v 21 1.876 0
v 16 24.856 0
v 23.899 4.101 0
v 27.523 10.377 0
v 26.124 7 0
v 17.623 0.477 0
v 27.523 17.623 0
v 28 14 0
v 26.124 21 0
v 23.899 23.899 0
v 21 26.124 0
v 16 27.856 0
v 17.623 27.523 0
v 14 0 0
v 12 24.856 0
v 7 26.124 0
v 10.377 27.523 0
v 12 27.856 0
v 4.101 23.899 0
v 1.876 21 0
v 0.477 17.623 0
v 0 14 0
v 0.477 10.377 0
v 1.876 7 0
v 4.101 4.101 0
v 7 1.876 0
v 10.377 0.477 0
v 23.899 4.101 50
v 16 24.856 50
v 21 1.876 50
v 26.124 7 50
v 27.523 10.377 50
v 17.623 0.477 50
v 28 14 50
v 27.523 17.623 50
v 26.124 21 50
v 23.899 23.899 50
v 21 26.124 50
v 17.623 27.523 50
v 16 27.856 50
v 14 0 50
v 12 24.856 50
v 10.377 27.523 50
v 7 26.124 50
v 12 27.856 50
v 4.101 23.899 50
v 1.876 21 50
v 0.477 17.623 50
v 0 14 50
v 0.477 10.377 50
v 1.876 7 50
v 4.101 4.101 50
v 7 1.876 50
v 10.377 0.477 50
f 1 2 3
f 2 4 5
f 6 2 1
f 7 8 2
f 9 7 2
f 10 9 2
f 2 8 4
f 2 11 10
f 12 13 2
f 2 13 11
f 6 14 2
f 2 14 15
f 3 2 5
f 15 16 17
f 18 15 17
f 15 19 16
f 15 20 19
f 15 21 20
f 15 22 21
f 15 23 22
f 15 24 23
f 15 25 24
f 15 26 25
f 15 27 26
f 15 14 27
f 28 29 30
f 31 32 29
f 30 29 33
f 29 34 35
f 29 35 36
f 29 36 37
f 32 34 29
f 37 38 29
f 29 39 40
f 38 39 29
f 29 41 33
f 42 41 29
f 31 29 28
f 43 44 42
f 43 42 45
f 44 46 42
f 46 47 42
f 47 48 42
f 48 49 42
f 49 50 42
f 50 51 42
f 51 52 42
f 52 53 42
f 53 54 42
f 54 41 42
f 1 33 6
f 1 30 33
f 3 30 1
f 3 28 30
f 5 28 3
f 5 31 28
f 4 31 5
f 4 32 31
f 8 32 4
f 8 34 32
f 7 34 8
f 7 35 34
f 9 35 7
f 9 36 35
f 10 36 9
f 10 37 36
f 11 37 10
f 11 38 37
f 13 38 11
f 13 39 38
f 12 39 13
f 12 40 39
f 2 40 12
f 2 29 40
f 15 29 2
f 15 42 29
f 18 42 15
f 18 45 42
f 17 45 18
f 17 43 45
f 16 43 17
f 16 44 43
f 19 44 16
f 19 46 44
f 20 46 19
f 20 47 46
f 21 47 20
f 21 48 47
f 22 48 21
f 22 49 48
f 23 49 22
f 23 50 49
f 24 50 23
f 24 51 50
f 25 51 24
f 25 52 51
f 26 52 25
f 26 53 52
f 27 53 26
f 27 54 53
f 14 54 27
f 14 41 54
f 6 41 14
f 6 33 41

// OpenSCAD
$fn = 32;

// ----------------------------------------------------------------------
// Keyway shaft: d28 shaft, key 4 x 3 mm
// ----------------------------------------------------------------------

// --- parameters (mm) ---
shaft_r = 14;             // shaft radius
key_w = 4;                // keyway width
key_d = 3;                // keyway depth below the surface line
plate_t = 50;             // shaft length, Z (extrusion height)

shaft_d = 2 * shaft_r;  // shaft diameter
circle_step = 15;  // polygon sampling step, degrees

profile = [[10.377, 27.523], [7, 26.124], [4.101, 23.899], [1.876, 21], [0.477, 17.623], [0, 14], [0.477, 10.377], [1.876, 7], [4.101, 4.101], [7, 1.876], [10.377, 0.477], [14, 0], [17.623, 0.477], [21, 1.876], [23.899, 4.101], [26.124, 7], [27.523, 10.377], [28, 14], [27.523, 17.623], [26.124, 21], [23.899, 23.899], [21, 26.124], [17.623, 27.523], [16, 27.856], [16, 24.856], [12, 24.856], [12, 27.856]];  // primary outline, 27 points, counter clockwise

// --- the one profile operation ---
linear_extrude(height = plate_t) polygon(points = profile);
